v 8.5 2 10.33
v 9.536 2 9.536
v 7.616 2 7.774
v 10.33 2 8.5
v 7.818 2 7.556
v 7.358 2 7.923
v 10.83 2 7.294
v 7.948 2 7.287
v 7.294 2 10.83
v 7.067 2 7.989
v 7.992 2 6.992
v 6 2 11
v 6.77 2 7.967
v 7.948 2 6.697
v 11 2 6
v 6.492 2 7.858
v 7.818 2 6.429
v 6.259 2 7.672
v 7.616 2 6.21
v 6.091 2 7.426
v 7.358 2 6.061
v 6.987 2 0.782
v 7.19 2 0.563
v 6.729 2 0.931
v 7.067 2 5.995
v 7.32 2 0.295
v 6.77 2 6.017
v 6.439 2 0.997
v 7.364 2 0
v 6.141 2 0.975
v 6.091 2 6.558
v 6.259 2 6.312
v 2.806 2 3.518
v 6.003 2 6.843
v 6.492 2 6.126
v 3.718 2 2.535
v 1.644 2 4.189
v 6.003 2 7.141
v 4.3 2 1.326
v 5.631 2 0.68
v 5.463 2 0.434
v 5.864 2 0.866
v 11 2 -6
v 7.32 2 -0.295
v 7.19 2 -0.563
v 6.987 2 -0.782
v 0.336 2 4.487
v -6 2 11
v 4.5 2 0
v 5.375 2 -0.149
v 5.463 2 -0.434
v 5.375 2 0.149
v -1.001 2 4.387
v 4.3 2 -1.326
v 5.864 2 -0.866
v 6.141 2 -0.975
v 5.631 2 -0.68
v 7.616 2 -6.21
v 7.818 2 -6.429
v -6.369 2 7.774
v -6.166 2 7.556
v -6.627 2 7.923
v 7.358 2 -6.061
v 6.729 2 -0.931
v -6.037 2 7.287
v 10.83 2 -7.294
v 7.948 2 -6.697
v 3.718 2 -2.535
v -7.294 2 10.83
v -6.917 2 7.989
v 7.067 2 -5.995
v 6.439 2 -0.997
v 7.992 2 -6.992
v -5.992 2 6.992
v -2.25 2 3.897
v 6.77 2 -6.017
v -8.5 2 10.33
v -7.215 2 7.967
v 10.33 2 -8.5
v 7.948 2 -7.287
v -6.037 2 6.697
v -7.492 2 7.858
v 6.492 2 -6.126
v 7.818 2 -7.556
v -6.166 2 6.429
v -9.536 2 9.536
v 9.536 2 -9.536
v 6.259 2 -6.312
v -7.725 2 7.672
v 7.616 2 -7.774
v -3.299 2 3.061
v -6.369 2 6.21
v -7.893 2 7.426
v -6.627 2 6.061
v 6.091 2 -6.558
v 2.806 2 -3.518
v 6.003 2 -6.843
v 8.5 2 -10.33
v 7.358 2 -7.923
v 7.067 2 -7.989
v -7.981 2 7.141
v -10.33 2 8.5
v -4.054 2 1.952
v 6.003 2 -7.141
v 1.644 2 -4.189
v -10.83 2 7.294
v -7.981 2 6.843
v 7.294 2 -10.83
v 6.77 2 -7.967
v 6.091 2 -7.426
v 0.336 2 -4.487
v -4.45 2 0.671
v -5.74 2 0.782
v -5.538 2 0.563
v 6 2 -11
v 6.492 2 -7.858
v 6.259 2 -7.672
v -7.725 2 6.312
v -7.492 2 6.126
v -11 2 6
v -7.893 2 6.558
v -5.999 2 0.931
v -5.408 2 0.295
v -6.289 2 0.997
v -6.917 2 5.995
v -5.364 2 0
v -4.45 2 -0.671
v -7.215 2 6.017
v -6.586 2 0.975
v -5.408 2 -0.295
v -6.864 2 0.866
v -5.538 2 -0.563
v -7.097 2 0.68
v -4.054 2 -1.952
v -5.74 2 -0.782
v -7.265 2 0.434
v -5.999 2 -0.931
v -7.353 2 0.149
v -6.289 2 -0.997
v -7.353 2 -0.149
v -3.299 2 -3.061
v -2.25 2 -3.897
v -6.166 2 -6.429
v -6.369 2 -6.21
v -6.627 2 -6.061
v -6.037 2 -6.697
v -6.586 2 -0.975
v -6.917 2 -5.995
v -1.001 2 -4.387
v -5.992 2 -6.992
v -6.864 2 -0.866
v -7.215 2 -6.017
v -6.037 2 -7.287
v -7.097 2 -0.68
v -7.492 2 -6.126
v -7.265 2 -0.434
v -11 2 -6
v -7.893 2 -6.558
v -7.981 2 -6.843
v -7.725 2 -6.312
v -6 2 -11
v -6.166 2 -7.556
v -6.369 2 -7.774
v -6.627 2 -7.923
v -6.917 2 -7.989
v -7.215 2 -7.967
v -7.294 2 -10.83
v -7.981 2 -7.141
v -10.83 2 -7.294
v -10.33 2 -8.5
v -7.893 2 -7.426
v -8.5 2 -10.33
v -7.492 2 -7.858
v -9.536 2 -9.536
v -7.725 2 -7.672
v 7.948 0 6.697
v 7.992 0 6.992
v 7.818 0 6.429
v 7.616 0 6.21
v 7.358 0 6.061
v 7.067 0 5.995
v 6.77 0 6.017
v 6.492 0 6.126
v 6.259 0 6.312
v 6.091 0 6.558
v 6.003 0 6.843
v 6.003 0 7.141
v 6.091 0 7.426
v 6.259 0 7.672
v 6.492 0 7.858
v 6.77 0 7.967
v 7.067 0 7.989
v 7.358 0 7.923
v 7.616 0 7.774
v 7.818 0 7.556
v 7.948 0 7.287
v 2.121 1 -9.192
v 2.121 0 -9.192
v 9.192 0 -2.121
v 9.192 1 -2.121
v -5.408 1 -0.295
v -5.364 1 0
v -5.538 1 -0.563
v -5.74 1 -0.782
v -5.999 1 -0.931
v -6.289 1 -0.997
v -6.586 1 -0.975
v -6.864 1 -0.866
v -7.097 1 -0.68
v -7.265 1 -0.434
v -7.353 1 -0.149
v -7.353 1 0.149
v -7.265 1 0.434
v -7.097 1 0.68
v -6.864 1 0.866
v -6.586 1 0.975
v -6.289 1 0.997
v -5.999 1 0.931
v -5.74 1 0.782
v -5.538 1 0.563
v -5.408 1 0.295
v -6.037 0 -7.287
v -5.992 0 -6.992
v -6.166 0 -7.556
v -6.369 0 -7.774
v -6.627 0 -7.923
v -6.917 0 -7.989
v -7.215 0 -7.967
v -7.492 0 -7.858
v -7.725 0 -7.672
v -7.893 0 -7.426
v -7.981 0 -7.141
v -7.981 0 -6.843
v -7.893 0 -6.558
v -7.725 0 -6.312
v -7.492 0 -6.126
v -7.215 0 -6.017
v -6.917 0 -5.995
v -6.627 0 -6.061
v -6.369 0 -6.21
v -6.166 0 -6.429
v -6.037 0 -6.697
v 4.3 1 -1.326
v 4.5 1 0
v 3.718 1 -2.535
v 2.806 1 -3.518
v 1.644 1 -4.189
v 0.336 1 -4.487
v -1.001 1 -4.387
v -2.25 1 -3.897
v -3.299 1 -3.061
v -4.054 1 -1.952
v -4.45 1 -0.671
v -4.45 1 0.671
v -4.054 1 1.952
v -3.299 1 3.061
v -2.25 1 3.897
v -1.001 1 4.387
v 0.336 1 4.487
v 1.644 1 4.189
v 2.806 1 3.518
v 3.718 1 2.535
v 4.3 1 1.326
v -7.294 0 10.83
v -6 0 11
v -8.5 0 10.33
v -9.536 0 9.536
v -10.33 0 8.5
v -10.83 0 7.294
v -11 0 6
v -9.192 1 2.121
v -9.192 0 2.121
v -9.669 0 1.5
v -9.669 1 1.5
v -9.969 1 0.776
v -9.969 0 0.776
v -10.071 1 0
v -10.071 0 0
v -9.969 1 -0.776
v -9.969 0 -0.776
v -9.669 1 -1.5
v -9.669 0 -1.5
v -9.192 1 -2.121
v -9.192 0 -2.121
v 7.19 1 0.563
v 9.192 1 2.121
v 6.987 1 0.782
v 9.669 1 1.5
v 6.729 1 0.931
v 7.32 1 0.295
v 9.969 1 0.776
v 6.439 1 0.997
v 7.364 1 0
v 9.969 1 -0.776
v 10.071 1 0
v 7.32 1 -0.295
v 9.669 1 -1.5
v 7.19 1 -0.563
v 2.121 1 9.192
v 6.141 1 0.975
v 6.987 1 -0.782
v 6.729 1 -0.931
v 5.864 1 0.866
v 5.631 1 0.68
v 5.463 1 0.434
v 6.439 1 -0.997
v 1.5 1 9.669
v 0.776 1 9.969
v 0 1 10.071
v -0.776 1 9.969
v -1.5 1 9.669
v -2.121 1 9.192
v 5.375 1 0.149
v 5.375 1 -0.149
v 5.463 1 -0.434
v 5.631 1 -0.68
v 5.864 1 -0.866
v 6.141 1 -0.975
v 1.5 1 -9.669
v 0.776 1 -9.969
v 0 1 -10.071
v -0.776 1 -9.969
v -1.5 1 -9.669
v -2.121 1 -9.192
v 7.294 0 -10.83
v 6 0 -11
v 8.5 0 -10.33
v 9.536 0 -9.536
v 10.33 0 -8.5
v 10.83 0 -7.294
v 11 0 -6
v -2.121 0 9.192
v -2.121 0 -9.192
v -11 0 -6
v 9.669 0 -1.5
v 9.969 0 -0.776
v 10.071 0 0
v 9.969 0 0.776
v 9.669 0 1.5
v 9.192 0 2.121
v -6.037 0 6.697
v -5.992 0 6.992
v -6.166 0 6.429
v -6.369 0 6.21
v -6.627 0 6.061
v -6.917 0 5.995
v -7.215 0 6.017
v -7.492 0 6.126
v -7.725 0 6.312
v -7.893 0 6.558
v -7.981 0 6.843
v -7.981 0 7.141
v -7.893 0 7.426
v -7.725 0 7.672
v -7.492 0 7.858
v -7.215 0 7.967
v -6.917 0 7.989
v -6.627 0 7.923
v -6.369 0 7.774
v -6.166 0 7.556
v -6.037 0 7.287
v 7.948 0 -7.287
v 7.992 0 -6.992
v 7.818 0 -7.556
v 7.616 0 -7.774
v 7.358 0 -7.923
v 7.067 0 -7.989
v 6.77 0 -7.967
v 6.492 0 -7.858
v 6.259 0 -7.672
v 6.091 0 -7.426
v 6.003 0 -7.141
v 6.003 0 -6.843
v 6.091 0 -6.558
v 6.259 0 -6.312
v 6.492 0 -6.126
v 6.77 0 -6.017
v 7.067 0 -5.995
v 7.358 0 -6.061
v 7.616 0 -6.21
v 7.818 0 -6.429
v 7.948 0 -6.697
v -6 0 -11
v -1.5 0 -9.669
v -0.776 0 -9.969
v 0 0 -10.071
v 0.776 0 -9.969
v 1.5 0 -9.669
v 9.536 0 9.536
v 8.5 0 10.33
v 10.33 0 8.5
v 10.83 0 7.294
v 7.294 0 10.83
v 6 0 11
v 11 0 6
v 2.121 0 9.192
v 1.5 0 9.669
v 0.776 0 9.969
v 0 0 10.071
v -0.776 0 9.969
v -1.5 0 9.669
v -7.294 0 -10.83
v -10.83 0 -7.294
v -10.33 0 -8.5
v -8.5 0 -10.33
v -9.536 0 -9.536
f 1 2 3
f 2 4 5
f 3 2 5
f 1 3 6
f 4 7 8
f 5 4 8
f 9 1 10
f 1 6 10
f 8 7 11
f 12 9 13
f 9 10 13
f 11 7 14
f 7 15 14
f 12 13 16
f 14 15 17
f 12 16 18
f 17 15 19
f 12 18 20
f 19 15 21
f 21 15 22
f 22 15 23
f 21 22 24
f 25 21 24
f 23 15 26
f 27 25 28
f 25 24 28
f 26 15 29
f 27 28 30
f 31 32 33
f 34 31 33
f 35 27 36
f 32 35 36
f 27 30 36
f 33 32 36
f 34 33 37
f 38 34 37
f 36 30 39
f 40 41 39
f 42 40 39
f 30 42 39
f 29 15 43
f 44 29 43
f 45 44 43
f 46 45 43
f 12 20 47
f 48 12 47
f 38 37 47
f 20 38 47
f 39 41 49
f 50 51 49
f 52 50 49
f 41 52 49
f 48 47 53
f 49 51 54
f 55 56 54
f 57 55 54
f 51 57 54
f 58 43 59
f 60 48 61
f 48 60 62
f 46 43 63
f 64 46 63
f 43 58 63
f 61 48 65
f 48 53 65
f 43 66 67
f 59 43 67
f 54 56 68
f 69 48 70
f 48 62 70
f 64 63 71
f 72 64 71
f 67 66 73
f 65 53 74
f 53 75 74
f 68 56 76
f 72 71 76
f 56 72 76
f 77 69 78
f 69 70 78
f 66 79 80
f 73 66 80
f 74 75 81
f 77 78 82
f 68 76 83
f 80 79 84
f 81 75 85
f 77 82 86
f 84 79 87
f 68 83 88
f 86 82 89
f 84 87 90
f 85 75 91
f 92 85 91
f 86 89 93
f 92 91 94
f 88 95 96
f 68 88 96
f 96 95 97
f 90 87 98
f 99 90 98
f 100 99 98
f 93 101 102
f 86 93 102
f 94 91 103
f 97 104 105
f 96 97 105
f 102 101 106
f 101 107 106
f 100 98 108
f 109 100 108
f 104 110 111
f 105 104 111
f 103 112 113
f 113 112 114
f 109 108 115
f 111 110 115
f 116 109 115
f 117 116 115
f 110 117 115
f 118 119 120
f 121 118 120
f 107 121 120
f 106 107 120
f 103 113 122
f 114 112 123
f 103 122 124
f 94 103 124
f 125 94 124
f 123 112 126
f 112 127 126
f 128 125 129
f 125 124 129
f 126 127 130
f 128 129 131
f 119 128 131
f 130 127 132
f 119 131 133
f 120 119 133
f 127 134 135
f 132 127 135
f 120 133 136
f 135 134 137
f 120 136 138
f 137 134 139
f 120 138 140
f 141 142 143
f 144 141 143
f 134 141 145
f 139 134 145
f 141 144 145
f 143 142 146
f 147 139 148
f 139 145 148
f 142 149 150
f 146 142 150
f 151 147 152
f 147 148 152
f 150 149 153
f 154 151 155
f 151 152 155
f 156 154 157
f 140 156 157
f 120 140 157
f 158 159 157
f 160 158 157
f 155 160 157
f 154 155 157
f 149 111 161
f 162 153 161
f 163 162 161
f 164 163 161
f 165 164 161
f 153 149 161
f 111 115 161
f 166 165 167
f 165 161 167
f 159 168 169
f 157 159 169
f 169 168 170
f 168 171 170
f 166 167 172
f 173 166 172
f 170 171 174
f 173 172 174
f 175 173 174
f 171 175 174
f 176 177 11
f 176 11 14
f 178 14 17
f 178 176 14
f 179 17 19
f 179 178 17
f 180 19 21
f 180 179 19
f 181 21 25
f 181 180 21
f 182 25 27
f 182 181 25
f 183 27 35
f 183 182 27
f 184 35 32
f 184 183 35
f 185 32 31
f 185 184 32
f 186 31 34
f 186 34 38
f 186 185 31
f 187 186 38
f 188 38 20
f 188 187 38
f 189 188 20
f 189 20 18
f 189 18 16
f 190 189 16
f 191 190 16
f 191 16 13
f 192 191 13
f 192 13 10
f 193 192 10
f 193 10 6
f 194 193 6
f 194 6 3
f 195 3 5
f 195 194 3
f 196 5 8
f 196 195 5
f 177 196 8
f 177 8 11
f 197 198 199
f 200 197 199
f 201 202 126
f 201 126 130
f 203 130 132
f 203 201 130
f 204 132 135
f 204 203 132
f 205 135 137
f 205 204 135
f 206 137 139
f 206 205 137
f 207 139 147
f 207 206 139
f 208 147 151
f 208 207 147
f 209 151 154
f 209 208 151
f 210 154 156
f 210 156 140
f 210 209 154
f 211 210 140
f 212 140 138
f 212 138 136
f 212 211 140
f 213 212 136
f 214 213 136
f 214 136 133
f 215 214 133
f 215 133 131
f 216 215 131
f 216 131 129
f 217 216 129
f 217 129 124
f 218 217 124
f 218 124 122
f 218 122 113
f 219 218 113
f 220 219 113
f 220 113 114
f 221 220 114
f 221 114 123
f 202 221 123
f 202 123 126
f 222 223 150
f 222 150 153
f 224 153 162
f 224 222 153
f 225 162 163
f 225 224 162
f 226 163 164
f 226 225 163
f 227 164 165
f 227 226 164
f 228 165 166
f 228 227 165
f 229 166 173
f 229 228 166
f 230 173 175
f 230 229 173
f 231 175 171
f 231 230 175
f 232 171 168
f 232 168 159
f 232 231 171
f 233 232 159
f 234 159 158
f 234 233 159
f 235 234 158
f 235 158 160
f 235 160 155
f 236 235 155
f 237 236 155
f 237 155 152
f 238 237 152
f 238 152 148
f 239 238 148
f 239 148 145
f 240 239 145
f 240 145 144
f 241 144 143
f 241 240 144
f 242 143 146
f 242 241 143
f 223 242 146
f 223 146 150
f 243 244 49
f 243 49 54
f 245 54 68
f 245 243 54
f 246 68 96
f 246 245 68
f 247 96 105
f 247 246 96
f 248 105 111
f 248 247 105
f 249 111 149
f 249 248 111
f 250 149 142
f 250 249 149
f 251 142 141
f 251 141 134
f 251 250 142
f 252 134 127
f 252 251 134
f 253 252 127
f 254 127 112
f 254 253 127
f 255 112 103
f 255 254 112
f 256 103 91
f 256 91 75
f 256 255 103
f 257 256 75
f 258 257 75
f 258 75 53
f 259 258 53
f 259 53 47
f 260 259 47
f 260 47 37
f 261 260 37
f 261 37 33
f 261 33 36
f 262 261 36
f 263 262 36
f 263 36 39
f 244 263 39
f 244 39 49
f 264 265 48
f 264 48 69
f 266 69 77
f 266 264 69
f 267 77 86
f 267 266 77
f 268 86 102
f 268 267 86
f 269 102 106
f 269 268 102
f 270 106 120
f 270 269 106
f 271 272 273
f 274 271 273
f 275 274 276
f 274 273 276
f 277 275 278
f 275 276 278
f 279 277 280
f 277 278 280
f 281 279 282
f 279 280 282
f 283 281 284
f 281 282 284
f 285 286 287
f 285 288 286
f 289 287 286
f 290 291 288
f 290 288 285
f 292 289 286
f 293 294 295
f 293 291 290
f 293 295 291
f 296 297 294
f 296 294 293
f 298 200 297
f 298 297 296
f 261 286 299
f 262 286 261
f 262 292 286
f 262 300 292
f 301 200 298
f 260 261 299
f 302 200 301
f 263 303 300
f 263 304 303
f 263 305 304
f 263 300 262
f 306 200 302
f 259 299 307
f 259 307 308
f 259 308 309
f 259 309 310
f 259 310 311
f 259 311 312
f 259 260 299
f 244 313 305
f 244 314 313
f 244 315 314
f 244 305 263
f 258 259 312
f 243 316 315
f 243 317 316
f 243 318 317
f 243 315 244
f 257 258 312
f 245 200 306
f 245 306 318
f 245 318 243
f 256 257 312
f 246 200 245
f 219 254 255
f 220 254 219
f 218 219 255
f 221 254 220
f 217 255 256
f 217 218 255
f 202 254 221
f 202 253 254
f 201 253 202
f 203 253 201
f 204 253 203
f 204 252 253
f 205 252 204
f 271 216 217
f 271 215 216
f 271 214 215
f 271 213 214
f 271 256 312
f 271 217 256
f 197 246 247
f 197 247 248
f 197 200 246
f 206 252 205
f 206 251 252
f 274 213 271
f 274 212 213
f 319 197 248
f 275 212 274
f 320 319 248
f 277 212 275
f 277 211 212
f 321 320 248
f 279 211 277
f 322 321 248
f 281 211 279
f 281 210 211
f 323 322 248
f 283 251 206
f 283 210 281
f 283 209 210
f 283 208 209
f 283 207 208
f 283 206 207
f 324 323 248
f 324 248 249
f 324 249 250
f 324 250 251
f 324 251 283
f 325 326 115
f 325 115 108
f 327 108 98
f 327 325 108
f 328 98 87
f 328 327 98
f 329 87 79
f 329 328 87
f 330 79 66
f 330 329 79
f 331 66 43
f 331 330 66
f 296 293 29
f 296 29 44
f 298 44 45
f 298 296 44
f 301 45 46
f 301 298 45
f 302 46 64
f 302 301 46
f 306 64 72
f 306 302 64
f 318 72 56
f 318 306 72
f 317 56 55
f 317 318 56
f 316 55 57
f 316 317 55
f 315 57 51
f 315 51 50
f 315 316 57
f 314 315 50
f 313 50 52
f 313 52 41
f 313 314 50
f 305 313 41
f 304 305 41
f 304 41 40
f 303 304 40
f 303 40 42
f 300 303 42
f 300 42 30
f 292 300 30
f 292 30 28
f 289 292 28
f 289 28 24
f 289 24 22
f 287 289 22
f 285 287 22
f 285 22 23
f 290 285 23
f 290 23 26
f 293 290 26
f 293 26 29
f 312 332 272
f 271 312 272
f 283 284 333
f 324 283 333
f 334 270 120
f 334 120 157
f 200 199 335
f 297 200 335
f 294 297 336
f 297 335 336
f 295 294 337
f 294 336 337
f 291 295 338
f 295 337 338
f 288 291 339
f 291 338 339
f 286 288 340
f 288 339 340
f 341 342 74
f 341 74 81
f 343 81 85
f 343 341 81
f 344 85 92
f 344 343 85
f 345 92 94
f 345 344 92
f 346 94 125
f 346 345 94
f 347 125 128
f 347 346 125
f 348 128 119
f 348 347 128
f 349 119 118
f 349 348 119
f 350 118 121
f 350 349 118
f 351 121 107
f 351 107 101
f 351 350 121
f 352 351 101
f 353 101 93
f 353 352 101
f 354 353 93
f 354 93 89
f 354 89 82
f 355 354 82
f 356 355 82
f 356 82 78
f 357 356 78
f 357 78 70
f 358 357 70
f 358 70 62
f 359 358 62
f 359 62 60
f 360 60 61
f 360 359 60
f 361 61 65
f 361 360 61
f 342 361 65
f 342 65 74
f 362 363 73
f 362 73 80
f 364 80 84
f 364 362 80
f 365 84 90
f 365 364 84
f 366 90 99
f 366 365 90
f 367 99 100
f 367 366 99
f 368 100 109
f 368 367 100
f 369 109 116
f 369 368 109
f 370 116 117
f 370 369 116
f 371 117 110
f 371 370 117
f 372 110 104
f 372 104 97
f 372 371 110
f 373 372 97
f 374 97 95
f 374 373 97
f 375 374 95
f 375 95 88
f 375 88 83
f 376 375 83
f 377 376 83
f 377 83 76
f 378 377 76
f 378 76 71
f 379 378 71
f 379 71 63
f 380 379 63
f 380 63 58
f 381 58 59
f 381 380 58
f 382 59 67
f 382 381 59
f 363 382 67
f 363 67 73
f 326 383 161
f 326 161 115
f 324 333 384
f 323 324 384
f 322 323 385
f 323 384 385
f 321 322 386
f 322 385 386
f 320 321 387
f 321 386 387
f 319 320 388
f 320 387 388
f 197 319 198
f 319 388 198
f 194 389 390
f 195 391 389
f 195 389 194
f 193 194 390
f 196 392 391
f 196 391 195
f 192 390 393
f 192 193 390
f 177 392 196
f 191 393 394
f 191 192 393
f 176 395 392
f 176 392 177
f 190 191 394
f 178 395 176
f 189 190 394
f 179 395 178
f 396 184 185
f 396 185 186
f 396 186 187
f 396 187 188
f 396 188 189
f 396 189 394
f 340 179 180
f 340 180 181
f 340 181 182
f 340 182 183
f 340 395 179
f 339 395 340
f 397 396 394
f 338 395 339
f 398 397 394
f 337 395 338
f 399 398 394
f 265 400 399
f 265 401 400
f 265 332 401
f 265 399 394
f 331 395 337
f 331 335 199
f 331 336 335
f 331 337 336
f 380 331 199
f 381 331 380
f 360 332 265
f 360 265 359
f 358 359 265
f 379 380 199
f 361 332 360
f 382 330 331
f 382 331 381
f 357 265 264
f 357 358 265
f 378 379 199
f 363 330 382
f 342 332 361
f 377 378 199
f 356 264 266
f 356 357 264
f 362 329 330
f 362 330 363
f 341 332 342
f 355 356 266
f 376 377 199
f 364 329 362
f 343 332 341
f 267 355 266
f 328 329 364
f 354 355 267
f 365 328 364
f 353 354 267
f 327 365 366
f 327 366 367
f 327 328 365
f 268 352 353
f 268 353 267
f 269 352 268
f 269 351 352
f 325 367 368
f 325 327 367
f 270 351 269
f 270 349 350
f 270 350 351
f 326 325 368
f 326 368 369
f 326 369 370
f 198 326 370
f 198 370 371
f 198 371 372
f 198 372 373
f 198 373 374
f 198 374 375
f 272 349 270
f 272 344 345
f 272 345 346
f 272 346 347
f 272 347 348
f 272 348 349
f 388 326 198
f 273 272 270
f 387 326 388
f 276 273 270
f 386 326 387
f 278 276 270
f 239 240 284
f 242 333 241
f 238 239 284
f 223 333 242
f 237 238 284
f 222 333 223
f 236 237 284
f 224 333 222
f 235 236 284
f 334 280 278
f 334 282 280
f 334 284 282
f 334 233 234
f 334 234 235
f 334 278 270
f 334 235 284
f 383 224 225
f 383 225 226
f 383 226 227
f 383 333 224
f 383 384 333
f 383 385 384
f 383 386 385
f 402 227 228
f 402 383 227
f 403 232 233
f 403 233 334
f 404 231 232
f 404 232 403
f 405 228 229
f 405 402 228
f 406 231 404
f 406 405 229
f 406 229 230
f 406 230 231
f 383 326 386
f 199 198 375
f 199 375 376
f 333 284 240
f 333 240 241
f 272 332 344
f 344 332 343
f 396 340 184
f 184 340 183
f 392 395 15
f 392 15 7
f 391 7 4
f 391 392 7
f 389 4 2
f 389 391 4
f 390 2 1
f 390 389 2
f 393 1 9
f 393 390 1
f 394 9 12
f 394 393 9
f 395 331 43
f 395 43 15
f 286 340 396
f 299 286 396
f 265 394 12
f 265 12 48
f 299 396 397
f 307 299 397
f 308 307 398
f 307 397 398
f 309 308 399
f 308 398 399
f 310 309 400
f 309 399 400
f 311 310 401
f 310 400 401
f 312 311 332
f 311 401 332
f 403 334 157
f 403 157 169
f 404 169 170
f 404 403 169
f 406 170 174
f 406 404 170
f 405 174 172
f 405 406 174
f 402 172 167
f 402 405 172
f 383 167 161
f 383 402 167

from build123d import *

# Parameters (mm, degrees)
SKETCH1_R           = 1
SKETCH1_R_2         = 4.5
BOSS_EXTRUDE1_DEPTH = 2
SKETCH1_4_R         = 1
SKETCH1_4_R_2       = 4.5
CUT_EXTRUDE1_DEPTH  = 1


with BuildPart() as part:
    # Sketch1 → Boss-Extrude1 (new body)
    with BuildSketch(Plane(origin=(0, 0, 0), x_dir=(1, 0, 0), z_dir=(0, 1, 0))):
        with BuildLine():
            Line((6, 11), (-6, 11))
            ThreePointArc((-6, 11), (-9.535533906, 9.535533906), (-11, 6))
            Line((-11, 6), (-11, -6))
            ThreePointArc((-11, -6), (-9.535533906, -9.535533906), (-6, -11))
            Line((-6, -11), (6, -11))
            ThreePointArc((6, -11), (9.535533906, -9.535533906), (11, -6))
            Line((11, -6), (11, 6))
            ThreePointArc((11, 6), (9.535533906, 9.535533906), (6, 11))
        make_face()
        with Locations((-6.992221877, -6.992221877)):
            Circle(SKETCH1_R, mode=Mode.SUBTRACT)
        with Locations((6.992221877, -6.992221877)):
            Circle(SKETCH1_R, mode=Mode.SUBTRACT)
        with Locations((-6.992221877, 6.992221877)):
            Circle(SKETCH1_R, mode=Mode.SUBTRACT)
        with Locations((6.992221877, 6.992221877)):
            Circle(SKETCH1_R, mode=Mode.SUBTRACT)
        Circle(SKETCH1_R_2, mode=Mode.SUBTRACT)
        with Locations((6.363961031, 0)):
            Circle(SKETCH1_R, mode=Mode.SUBTRACT)
        with Locations((-6.363961031, 0)):
            Circle(SKETCH1_R, mode=Mode.SUBTRACT)
    extrude(amount=BOSS_EXTRUDE1_DEPTH)

    # Sketch1<4> → Cut-Extrude1 (cut)
    with BuildSketch(Plane(origin=(0, 0, 0), x_dir=(1, 0, 0), z_dir=(0, 1, 0))):
        with BuildLine():
            Line((9.192388155, 2.121320344), (2.121320344, 9.192388155))
            ThreePointArc((2.121320344, 9.192388155), (0, 10.071067812), (-2.121320344, 9.192388155))
            Line((-2.121320344, 9.192388155), (-9.192388155, 2.121320344))
            ThreePointArc((-9.192388155, 2.121320344), (-10.071067812, 0), (-9.192388155, -2.121320344))
            Line((-9.192388155, -2.121320344), (-2.121320344, -9.192388155))
            ThreePointArc((-2.121320344, -9.192388155), (0, -10.071067812), (2.121320344, -9.192388155))
            Line((2.121320344, -9.192388155), (9.192388155, -2.121320344))
            ThreePointArc((9.192388155, -2.121320344), (10.071067812, 0), (9.192388155, 2.121320344))
        make_face()
        with Locations((-6.363961031, 0)):
            Circle(SKETCH1_4_R, mode=Mode.SUBTRACT)
        Circle(SKETCH1_4_R_2, mode=Mode.SUBTRACT)
        with Locations((6.363961031, 0)):
            Circle(SKETCH1_4_R, mode=Mode.SUBTRACT)
    extrude(amount=CUT_EXTRUDE1_DEPTH, mode=Mode.SUBTRACT)


solid = part.part
